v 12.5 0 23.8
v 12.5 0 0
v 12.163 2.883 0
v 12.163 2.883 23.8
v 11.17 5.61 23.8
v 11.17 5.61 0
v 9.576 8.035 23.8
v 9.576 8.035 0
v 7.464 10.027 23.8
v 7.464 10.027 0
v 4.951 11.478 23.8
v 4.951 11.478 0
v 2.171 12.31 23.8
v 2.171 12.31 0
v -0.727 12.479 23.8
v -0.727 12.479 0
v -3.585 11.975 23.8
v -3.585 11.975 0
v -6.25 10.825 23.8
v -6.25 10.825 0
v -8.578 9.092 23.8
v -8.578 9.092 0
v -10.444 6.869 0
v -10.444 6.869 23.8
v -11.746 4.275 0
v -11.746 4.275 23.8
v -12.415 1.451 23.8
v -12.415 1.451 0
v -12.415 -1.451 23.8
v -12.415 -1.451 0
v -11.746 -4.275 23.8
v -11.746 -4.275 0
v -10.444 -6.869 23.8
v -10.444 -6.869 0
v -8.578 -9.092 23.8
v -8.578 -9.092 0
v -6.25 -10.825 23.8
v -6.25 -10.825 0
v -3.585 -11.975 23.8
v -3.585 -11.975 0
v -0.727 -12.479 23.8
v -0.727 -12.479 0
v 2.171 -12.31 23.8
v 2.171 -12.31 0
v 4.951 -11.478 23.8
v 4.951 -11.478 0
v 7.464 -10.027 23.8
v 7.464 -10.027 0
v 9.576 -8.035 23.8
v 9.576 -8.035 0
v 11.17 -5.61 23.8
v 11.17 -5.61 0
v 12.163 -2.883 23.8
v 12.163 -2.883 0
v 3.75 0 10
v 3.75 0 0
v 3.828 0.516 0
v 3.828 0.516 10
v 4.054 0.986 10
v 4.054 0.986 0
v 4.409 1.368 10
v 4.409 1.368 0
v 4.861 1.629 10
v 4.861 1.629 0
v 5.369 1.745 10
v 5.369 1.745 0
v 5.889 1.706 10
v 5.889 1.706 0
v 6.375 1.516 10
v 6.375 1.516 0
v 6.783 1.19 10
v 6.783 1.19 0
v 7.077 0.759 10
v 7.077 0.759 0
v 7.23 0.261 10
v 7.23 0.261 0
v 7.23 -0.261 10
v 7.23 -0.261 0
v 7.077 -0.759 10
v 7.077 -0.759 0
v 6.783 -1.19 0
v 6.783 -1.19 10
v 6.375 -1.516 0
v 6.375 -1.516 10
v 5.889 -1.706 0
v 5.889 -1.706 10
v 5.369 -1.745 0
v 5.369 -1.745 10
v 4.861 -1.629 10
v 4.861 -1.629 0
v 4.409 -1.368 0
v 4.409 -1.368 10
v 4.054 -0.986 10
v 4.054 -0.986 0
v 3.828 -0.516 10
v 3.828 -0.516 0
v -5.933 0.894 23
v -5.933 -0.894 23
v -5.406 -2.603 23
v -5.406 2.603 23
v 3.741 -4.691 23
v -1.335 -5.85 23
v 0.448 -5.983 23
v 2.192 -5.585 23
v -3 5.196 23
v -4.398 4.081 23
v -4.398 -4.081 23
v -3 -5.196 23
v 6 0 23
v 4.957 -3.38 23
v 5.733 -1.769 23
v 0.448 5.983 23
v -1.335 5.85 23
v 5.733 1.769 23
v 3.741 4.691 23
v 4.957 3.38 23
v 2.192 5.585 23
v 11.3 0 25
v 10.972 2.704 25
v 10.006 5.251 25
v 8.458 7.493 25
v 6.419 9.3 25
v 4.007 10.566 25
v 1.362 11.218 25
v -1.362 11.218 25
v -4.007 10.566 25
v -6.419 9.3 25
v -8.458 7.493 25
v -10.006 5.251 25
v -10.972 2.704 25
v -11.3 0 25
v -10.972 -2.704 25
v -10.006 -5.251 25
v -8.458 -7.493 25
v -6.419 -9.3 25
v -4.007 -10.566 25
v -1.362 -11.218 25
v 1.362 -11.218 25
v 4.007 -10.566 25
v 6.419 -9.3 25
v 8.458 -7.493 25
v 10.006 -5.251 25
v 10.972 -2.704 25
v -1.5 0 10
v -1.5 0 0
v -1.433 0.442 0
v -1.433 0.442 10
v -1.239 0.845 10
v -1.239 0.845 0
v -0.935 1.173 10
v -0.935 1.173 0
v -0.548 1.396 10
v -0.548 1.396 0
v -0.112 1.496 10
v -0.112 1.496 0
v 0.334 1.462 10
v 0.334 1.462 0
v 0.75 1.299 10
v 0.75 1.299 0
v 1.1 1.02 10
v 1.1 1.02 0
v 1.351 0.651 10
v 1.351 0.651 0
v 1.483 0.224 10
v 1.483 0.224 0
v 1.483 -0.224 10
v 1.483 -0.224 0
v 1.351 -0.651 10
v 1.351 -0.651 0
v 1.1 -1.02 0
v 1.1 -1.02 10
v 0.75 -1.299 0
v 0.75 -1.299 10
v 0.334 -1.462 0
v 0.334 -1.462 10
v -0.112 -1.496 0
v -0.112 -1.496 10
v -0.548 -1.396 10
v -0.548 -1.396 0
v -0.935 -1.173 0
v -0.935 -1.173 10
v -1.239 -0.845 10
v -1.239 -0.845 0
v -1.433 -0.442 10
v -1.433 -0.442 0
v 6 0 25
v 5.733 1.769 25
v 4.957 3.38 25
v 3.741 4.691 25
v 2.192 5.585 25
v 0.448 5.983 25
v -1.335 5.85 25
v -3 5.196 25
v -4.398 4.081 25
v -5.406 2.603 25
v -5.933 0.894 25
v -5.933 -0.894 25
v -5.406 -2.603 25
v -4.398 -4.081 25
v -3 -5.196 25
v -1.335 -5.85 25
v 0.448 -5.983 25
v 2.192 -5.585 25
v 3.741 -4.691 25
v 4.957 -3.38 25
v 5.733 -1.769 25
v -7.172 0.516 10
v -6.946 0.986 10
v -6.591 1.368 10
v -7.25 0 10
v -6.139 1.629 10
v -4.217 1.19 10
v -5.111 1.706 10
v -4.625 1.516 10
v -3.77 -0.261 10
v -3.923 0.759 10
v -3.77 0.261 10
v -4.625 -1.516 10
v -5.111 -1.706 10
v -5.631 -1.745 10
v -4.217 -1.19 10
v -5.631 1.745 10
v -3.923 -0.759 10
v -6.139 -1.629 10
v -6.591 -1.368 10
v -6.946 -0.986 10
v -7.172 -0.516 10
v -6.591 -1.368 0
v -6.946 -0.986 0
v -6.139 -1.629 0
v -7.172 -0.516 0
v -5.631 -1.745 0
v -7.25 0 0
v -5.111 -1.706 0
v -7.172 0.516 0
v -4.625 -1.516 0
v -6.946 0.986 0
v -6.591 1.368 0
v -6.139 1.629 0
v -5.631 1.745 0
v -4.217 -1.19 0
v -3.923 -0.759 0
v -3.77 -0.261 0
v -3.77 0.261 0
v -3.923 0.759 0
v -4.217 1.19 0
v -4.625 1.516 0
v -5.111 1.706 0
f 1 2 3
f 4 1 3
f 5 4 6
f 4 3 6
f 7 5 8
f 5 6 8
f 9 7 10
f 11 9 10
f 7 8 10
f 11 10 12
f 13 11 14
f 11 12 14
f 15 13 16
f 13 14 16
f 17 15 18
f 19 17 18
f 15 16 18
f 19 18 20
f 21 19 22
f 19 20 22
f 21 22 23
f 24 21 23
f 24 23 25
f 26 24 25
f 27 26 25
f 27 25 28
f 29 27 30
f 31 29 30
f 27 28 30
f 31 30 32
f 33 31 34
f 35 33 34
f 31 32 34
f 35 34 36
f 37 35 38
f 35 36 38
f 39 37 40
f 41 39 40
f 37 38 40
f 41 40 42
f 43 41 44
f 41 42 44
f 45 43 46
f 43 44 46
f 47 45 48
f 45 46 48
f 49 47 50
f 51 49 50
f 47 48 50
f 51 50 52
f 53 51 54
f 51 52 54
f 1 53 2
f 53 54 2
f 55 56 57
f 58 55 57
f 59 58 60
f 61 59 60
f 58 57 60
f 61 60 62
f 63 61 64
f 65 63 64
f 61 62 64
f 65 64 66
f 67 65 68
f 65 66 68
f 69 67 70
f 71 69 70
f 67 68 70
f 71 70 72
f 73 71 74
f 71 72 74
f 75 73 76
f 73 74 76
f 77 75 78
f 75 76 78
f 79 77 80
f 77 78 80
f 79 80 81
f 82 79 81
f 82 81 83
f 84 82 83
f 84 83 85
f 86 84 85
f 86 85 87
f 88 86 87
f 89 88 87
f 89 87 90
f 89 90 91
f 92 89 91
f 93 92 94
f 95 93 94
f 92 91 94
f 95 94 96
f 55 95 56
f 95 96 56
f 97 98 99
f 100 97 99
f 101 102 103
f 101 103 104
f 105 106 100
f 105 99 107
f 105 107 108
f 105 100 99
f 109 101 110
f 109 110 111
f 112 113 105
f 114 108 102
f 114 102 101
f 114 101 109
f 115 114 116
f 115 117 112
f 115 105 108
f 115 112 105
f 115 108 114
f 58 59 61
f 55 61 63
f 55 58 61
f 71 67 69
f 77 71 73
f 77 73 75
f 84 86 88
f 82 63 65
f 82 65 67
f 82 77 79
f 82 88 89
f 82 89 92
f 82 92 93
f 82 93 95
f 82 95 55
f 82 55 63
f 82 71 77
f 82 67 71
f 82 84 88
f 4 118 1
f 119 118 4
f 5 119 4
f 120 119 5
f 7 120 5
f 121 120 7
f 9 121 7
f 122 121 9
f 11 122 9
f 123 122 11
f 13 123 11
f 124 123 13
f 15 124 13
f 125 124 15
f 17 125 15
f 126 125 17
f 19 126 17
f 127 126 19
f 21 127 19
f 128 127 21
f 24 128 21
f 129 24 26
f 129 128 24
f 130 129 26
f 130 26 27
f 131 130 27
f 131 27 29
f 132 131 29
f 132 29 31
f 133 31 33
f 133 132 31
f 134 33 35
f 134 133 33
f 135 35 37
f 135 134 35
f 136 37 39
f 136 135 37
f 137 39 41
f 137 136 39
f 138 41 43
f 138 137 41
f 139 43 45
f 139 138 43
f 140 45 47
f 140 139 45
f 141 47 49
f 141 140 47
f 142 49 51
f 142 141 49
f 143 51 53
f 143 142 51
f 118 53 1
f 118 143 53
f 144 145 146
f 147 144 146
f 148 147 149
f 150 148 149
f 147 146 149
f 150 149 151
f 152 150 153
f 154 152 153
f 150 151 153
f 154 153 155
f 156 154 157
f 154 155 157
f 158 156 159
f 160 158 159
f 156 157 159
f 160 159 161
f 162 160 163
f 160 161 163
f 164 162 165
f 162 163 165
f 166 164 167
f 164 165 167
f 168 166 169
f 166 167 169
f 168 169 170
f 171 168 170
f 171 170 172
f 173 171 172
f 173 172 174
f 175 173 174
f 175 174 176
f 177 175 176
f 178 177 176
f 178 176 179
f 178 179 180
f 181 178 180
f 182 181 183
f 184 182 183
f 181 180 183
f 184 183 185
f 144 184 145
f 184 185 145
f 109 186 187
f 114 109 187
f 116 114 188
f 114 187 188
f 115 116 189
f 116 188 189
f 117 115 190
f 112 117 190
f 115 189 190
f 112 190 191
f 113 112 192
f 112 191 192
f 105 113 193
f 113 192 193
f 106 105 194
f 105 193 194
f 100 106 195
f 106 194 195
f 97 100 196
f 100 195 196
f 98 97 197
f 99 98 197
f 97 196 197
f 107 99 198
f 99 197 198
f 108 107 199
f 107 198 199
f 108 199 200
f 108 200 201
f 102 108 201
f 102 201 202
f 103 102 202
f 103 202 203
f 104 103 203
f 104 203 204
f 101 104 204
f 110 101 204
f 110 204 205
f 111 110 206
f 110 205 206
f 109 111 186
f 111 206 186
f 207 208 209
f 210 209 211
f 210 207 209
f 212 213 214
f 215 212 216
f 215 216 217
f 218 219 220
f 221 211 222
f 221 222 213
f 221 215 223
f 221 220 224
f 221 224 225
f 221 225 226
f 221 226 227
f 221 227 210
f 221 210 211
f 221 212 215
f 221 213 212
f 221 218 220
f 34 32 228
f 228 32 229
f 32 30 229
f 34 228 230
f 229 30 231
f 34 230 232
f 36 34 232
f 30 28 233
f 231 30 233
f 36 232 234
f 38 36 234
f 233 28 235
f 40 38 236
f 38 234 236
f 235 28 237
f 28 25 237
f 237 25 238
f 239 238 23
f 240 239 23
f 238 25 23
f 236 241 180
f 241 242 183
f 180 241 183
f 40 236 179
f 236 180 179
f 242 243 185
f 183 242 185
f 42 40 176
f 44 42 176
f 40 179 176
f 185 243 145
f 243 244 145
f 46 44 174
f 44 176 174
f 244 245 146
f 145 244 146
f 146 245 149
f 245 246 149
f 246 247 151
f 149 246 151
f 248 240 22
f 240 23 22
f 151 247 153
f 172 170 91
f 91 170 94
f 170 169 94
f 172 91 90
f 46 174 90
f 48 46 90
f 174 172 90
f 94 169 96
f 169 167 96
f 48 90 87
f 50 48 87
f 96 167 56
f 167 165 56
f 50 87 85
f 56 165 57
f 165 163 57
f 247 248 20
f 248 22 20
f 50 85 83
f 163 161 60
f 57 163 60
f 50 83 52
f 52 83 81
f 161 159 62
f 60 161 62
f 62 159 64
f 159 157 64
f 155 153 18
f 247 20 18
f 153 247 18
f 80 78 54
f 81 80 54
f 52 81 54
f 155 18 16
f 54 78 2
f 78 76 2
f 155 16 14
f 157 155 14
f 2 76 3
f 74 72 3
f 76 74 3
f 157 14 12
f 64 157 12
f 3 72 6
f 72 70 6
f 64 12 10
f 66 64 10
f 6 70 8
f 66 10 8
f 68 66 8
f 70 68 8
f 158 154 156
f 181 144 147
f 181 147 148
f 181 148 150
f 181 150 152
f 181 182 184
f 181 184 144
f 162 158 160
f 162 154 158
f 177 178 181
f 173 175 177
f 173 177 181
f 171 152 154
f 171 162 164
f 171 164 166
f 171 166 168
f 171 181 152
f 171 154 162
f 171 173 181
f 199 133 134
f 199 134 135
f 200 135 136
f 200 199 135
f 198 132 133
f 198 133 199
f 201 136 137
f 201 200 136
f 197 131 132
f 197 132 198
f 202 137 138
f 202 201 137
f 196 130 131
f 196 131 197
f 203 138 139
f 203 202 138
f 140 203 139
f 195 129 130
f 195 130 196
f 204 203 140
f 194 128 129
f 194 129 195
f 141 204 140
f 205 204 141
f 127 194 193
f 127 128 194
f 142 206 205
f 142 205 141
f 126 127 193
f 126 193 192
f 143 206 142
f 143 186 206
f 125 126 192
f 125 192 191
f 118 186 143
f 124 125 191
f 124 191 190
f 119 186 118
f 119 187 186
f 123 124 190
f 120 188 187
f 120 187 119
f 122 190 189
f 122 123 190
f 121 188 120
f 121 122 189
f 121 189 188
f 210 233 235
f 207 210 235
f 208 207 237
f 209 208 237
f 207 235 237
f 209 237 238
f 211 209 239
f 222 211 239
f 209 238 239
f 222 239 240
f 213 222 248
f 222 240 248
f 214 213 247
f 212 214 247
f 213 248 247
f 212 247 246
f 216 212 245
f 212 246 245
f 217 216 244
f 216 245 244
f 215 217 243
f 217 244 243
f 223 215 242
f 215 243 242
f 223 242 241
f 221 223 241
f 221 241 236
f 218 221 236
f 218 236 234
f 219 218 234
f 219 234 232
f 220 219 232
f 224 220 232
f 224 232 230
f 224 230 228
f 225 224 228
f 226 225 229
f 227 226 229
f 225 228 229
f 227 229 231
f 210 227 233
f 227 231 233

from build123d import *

# Parameters (mm, degrees)
F0_R     = 12.5
F1_DEPTH = 25
F2_R     = 6
F3_DEPTH = 2
F5_DEPTH = 10
F6_SIZE  = 1.2


with BuildPart() as f1:
    # F0 (on Top) → F1 (new body)
    with BuildSketch(Plane.XY):
        Circle(F0_R)
    extrude(amount=F1_DEPTH)

    # F2 (on face) → F3 (cut)
    with BuildSketch(Plane.XY.offset(25)):
        Circle(F2_R)
    extrude(amount=-F3_DEPTH, mode=Mode.SUBTRACT)

    # F4 (on face) → F5 (cut)
    with BuildSketch(Plane(origin=(0, 0, 0), x_dir=(1, 0, 0), z_dir=(0, 0, -1))):
        with BuildLine():
            ThreePointArc((-3.75, 0), (-5.5, 1.75), (-7.25, 0))
            Line((-7.25, 0), (-3.75, 0))
        make_face()
        with BuildLine():
            ThreePointArc((7.25, 0), (5.5, 1.75), (3.75, 0))
            Line((3.75, 0), (7.25, 0))
        make_face()
        with BuildLine():
            Line((7.25, 0), (3.75, 0))
            ThreePointArc((3.75, 0), (5.5, -1.75), (7.25, 0))
        make_face()
        with BuildLine():
            ThreePointArc((1.5, 0), (0, 1.5), (-1.5, 0))
            Line((-1.5, 0), (1.5, 0))
        make_face()
        with BuildLine():
            Line((1.5, 0), (-1.5, 0))
            ThreePointArc((-1.5, 0), (0, -1.5), (1.5, 0))
        make_face()
        with BuildLine():
            Line((-3.75, 0), (-7.25, 0))
            ThreePointArc((-7.25, 0), (-5.5, -1.75), (-3.75, 0))
        make_face()
    extrude(amount=-F5_DEPTH, mode=Mode.SUBTRACT)

    # F6
    f6_edges = [f1.edges().sort_by_distance(p)[0] for p in [
        (-12.5, 0, 25),
    ]]
    chamfer(f6_edges, length=F6_SIZE)


solid = f1.part
